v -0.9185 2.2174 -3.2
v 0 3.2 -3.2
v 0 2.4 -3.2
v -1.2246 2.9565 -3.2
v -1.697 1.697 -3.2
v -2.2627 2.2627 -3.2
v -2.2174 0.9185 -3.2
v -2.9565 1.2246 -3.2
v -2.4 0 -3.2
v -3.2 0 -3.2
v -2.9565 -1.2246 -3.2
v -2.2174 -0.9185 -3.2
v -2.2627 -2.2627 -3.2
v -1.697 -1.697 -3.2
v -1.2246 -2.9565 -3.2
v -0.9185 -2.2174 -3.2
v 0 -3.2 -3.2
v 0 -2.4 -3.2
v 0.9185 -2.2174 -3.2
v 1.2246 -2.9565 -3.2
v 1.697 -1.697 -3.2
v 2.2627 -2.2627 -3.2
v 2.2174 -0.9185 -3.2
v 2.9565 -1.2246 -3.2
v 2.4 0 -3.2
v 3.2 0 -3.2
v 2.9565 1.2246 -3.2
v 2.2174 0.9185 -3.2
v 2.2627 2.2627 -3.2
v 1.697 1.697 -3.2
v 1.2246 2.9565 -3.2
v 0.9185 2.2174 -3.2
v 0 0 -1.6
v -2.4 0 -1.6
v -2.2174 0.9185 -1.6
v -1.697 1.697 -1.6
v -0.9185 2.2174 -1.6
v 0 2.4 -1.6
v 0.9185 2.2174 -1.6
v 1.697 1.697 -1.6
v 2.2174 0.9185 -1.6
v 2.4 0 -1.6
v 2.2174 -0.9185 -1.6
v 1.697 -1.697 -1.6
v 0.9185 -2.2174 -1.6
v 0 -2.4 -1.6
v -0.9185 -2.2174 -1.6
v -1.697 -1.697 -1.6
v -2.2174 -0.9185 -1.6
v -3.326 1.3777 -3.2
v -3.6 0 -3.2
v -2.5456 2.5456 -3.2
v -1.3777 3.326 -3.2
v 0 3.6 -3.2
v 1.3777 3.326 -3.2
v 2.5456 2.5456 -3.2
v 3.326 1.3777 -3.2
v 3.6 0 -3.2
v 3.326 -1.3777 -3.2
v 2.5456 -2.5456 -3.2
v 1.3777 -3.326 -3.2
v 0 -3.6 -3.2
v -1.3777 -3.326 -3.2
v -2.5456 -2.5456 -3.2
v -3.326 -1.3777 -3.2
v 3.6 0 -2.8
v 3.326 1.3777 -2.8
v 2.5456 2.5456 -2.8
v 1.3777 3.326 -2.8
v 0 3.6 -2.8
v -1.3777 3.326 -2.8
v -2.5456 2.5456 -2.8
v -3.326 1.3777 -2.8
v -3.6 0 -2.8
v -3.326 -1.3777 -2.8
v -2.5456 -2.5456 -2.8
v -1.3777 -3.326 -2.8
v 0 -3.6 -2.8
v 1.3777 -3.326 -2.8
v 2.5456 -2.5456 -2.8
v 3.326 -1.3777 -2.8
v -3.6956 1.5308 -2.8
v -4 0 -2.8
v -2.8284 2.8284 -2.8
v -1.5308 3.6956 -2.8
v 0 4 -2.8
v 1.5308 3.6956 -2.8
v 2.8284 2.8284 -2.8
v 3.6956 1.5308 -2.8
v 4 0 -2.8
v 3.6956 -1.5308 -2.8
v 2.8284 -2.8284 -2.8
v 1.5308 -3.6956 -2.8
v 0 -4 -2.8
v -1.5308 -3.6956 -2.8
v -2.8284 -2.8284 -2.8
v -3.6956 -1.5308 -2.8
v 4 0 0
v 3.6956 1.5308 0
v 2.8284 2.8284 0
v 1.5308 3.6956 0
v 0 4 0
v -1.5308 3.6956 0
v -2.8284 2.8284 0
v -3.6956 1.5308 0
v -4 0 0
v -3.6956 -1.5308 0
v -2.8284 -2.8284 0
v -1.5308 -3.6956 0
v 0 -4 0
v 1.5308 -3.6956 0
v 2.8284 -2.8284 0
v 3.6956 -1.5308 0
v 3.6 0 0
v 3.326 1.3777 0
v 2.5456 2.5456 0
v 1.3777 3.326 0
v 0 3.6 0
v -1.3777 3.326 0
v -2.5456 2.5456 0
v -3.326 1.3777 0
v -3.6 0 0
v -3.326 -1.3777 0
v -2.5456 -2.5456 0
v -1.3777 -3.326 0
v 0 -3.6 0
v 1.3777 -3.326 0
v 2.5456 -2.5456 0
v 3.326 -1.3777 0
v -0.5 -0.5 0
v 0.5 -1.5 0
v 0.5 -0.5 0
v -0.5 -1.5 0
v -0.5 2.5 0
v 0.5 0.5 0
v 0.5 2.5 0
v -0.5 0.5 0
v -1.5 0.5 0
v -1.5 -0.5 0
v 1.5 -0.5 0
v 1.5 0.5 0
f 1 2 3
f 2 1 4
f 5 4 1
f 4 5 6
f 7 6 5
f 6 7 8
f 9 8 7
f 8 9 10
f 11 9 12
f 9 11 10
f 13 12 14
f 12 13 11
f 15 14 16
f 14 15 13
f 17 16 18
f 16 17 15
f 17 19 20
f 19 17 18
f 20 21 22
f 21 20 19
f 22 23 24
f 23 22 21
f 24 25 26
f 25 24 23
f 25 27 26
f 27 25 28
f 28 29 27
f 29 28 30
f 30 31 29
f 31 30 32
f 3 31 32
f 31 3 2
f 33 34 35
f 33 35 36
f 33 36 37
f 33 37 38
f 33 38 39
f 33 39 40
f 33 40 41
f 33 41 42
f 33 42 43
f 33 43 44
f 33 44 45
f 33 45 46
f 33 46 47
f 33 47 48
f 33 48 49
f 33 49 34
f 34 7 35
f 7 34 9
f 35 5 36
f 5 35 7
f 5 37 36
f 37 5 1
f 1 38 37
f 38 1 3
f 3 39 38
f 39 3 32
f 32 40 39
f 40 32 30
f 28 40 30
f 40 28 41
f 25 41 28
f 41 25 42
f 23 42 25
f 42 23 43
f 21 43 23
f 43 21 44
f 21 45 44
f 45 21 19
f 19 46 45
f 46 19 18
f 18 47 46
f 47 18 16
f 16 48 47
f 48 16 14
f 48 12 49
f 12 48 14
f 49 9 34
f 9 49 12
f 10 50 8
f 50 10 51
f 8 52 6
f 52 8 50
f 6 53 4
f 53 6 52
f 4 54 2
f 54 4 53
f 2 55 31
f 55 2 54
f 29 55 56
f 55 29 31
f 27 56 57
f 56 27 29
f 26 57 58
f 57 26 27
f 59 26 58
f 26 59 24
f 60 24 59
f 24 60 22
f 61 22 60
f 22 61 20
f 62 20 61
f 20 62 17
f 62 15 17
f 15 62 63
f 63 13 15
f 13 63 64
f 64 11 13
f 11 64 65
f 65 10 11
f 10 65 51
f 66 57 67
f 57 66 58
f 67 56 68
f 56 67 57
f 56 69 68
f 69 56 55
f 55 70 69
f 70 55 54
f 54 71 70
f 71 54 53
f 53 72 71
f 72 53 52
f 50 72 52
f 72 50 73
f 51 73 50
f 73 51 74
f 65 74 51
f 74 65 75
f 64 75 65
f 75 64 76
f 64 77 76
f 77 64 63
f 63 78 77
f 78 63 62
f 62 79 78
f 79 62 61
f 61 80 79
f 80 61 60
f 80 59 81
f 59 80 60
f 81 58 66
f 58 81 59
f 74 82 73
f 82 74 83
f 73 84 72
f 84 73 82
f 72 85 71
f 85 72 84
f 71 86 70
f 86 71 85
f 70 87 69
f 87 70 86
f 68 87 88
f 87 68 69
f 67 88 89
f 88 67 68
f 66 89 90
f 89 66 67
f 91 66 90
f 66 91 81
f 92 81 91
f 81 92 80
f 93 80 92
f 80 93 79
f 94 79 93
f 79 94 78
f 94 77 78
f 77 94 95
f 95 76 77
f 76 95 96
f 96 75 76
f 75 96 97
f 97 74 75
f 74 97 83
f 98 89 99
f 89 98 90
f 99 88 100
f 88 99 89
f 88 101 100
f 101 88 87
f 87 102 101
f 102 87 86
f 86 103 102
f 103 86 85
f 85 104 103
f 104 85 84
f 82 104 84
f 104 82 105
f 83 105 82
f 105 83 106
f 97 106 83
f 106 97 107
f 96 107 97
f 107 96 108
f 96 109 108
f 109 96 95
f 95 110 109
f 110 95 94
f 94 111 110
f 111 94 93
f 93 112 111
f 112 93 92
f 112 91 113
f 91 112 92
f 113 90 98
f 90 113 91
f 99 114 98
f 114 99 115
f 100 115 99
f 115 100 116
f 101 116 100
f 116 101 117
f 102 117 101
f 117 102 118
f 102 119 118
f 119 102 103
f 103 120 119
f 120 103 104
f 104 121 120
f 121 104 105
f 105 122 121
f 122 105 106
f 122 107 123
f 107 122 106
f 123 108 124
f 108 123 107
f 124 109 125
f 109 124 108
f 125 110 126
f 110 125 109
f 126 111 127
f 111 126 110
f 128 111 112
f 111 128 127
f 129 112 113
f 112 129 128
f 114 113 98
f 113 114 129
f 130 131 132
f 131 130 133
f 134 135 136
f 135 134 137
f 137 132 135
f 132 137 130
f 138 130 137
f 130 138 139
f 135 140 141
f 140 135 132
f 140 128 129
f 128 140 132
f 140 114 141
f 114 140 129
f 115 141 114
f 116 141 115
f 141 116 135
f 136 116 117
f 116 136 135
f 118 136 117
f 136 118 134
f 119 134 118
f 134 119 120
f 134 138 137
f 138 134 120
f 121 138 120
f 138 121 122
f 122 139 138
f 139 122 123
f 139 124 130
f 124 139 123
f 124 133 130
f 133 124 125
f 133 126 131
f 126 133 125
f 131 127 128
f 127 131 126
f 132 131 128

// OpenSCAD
// file: ../p/4-4disc.scad
use <../lib.scad>
function ldraw_lib__4_4disc() = [
// 0 Disc 1.0
// 0 Name: 4-4disc.dat
// 0 Author: James Jessiman
// 0 !LDRAW_ORG Primitive UPDATE 2002-02
// 0 !LICENSE Licensed under CC BY 4.0 : see CAreadme.txt
// 
// 0 BFC CERTIFY CCW
  [0,"BFC","CERTIFY"],
  [0,"BFC","CCW"],
// 
// 0 !HISTORY 1998-12-15 [PTadmin] Official Update 1998-10
// 0 !HISTORY 2002-03-23 [sbliss] Added BFC statement
// 0 !HISTORY 2002-04-25 [PTadmin] Official Update 2002-02
// 0 !HISTORY 2007-06-24 [PTadmin] Header formatted for Contributor Agreement
// 0 !HISTORY 2008-07-01 [PTadmin] Official Update 2008-01
// 
// 
// 3 16 0 0 0 1 0 0 0.9239 0 0.3827
  [3,16,0,0,0,1,0,0,0.9239,0,0.3827],
// 3 16 0 0 0 0.9239 0 0.3827 0.7071 0 0.7071
  [3,16,0,0,0,0.9239,0,0.3827,0.7071,0,0.7071],
// 3 16 0 0 0 0.7071 0 0.7071 0.3827 0 0.9239
  [3,16,0,0,0,0.7071,0,0.7071,0.3827,0,0.9239],
// 3 16 0 0 0 0.3827 0 0.9239 0 0 1
  [3,16,0,0,0,0.3827,0,0.9239,0,0,1],
// 3 16 0 0 0 0 0 1 -0.3827 0 0.9239
  [3,16,0,0,0,0,0,1,-0.3827,0,0.9239],
// 3 16 0 0 0 -0.3827 0 0.9239 -0.7071 0 0.7071
  [3,16,0,0,0,-0.3827,0,0.9239,-0.7071,0,0.7071],
// 3 16 0 0 0 -0.7071 0 0.7071 -0.9239 0 0.3827
  [3,16,0,0,0,-0.7071,0,0.7071,-0.9239,0,0.3827],
// 3 16 0 0 0 -0.9239 0 0.3827 -1 0 -0
  [3,16,0,0,0,-0.9239,0,0.3827,-1,0,-0],
// 3 16 0 0 0 -1 0 -0 -0.9239 0 -0.3827
  [3,16,0,0,0,-1,0,-0,-0.9239,0,-0.3827],
// 3 16 0 0 0 -0.9239 0 -0.3827 -0.7071 0 -0.7071
  [3,16,0,0,0,-0.9239,0,-0.3827,-0.7071,0,-0.7071],
// 3 16 0 0 0 -0.7071 0 -0.7071 -0.3827 0 -0.9239
  [3,16,0,0,0,-0.7071,0,-0.7071,-0.3827,0,-0.9239],
// 3 16 0 0 0 -0.3827 0 -0.9239 0 0 -1
  [3,16,0,0,0,-0.3827,0,-0.9239,0,0,-1],
// 3 16 0 0 0 0 0 -1 0.3827 0 -0.9239
  [3,16,0,0,0,0,0,-1,0.3827,0,-0.9239],
// 3 16 0 0 0 0.3827 0 -0.9239 0.7071 0 -0.7071
  [3,16,0,0,0,0.3827,0,-0.9239,0.7071,0,-0.7071],
// 3 16 0 0 0 0.7071 0 -0.7071 0.9239 0 -0.3827
  [3,16,0,0,0,0.7071,0,-0.7071,0.9239,0,-0.3827],
// 3 16 0 0 0 0.9239 0 -0.3827 1 0 0
  [3,16,0,0,0,0.9239,0,-0.3827,1,0,0],
// 0
];
module ldraw_lib__4_4disc(step=0, col=false, unit=2/5, alt=false, line=0.2, solid=!$preview)
    makepoly(ldraw_lib__4_4disc(), step=step, col=col, unit=unit, alt=alt, line=line, solid=solid);
ldraw_lib__4_4disc(line=0.2);
// file: ../p/4-4ring3.scad
use <../lib.scad>
function ldraw_lib__4_4ring3() = [
// 0 Ring  3 x 1.0
// 0 Name: 4-4ring3.dat
// 0 Author: James Jessiman
// 0 !LDRAW_ORG Primitive UPDATE 2009-01
// 0 !LICENSE Licensed under CC BY 2.0 and CC BY 4.0 : see CAreadme.txt
// 
// 0 BFC CERTIFY CCW
  [0,"BFC","CERTIFY"],
  [0,"BFC","CCW"],
// 
// 0 !HISTORY 1998-12-15 [PTadmin] Official Update 1998-10
// 0 !HISTORY 2002-04-05 [hafhead] Added BFC statement
// 0 !HISTORY 2002-04-25 [PTadmin] Official Update 2002-02
// 0 !HISTORY 2007-06-24 [PTadmin] Header formatted for Contributor Agreement
// 0 !HISTORY 2008-07-01 [PTadmin] Official Update 2008-01
// 0 !HISTORY 2008-08-26 [cwdee] Switch polygon winding and rename
// 0 !HISTORY 2009-05-02 [PTadmin] Official Update 2009-01
// 
// 
// 4 16 -1.5308 0 3.6956 -1.1481 0 2.7717 0 0 3 0 0 4
  [4,16,-1.5308,0,3.6956,-1.1481,0,2.7717,0,0,3,0,0,4],
// 4 16 -2.8284 0 2.8284 -2.1213 0 2.1213 -1.1481 0 2.7717 -1.5308 0 3.6956
  [4,16,-2.8284,0,2.8284,-2.1213,0,2.1213,-1.1481,0,2.7717,-1.5308,0,3.6956],
// 4 16 -3.6956 0 1.5308 -2.7717 0 1.1481 -2.1213 0 2.1213 -2.8284 0 2.8284
  [4,16,-3.6956,0,1.5308,-2.7717,0,1.1481,-2.1213,0,2.1213,-2.8284,0,2.8284],
// 4 16 -4 0 0 -3 0 0 -2.7717 0 1.1481 -3.6956 0 1.5308
  [4,16,-4,0,0,-3,0,0,-2.7717,0,1.1481,-3.6956,0,1.5308],
// 4 16 -3.6956 0 -1.5308 -2.7717 0 -1.1481 -3 0 0 -4 0 0
  [4,16,-3.6956,0,-1.5308,-2.7717,0,-1.1481,-3,0,0,-4,0,0],
// 4 16 -2.8284 0 -2.8284 -2.1213 0 -2.1213 -2.7717 0 -1.1481 -3.6956 0 -1.5308
  [4,16,-2.8284,0,-2.8284,-2.1213,0,-2.1213,-2.7717,0,-1.1481,-3.6956,0,-1.5308],
// 4 16 -1.5308 0 -3.6956 -1.1481 0 -2.7717 -2.1213 0 -2.1213 -2.8284 0 -2.8284
  [4,16,-1.5308,0,-3.6956,-1.1481,0,-2.7717,-2.1213,0,-2.1213,-2.8284,0,-2.8284],
// 4 16 0 0 -4 0 0 -3 -1.1481 0 -2.7717 -1.5308 0 -3.6956
  [4,16,0,0,-4,0,0,-3,-1.1481,0,-2.7717,-1.5308,0,-3.6956],
// 4 16 1.5308 0 -3.6956 1.1481 0 -2.7717 0 0 -3 0 0 -4
  [4,16,1.5308,0,-3.6956,1.1481,0,-2.7717,0,0,-3,0,0,-4],
// 4 16 2.8284 0 -2.8284 2.1213 0 -2.1213 1.1481 0 -2.7717 1.5308 0 -3.6956
  [4,16,2.8284,0,-2.8284,2.1213,0,-2.1213,1.1481,0,-2.7717,1.5308,0,-3.6956],
// 4 16 3.6956 0 -1.5308 2.7717 0 -1.1481 2.1213 0 -2.1213 2.8284 0 -2.8284
  [4,16,3.6956,0,-1.5308,2.7717,0,-1.1481,2.1213,0,-2.1213,2.8284,0,-2.8284],
// 4 16 4 0 0 3 0 0 2.7717 0 -1.1481 3.6956 0 -1.5308
  [4,16,4,0,0,3,0,0,2.7717,0,-1.1481,3.6956,0,-1.5308],
// 4 16 3.6956 0 1.5308 2.7717 0 1.1481 3 0 0 4 0 0
  [4,16,3.6956,0,1.5308,2.7717,0,1.1481,3,0,0,4,0,0],
// 4 16 2.8284 0 2.8284 2.1213 0 2.1213 2.7717 0 1.1481 3.6956 0 1.5308
  [4,16,2.8284,0,2.8284,2.1213,0,2.1213,2.7717,0,1.1481,3.6956,0,1.5308],
// 4 16 1.5308 0 3.6956 1.1481 0 2.7717 2.1213 0 2.1213 2.8284 0 2.8284
  [4,16,1.5308,0,3.6956,1.1481,0,2.7717,2.1213,0,2.1213,2.8284,0,2.8284],
// 4 16 0 0 4 0 0 3 1.1481 0 2.7717 1.5308 0 3.6956
  [4,16,0,0,4,0,0,3,1.1481,0,2.7717,1.5308,0,3.6956],
// 0
];
module ldraw_lib__4_4ring3(step=0, col=false, unit=2/5, alt=false, line=0.2, solid=!$preview)
    makepoly(ldraw_lib__4_4ring3(), step=step, col=col, unit=unit, alt=alt, line=line, solid=solid);
ldraw_lib__4_4ring3(line=0.2);
// file: ../p/4-4cylc.scad
use <../lib.scad>
use <4-4cyli.scad>
use <4-4disc.scad>
use <4-4edge.scad>
function ldraw_lib__4_4cylc() = [
// 0 Cylinder Closed 1.0
// 0 Name: 4-4cylc.dat
// 0 Author: Alex Taylor [anathema]
// 0 !LDRAW_ORG Primitive UPDATE 2009-02
// 0 !LICENSE Licensed under CC BY 2.0 and CC BY 4.0 : see CAreadme.txt
// 
// 0 BFC CERTIFY CCW
  [0,"BFC","CERTIFY"],
  [0,"BFC","CCW"],
// 
// 0 !HISTORY 2008-12-29 [cwdee] Removed one disc
// 0 !HISTORY 2009-09-03 [PTadmin] Official Update 2009-02
// 
// 
// 1 16 0 0 0 1 0 0 0 1 0 0 0 1 4-4edge.dat
  [1,16,0,0,0,1,0,0,0,1,0,0,0,1, ldraw_lib__4_4edge()],
// 1 16 0 1 0 1 0 0 0 1 0 0 0 1 4-4edge.dat
  [1,16,0,1,0,1,0,0,0,1,0,0,0,1, ldraw_lib__4_4edge()],
// 1 16 0 0 0 1 0 0 0 1 0 0 0 1 4-4disc.dat
  [1,16,0,0,0,1,0,0,0,1,0,0,0,1, ldraw_lib__4_4disc()],
// 1 16 0 0 0 1 0 0 0 1 0 0 0 1 4-4cyli.dat
  [1,16,0,0,0,1,0,0,0,1,0,0,0,1, ldraw_lib__4_4cyli()],
// 0
];
module ldraw_lib__4_4cylc(step=0, col=false, unit=2/5, alt=false, line=0.2, solid=!$preview)
    makepoly(ldraw_lib__4_4cylc(), step=step, col=col, unit=unit, alt=alt, line=line, solid=solid);
ldraw_lib__4_4cylc(line=0.2);
// file: ../p/4-4edge.scad
use <../lib.scad>
function ldraw_lib__4_4edge() = [
// 0 Circle 1.0
// 0 Name: 4-4edge.dat
// 0 Author: James Jessiman
// 0 !LDRAW_ORG Primitive UPDATE 2017-01
// 0 !LICENSE Licensed under CC BY 4.0 : see CAreadme.txt
// 
// 0 BFC CERTIFY CCW
  [0,"BFC","CERTIFY"],
  [0,"BFC","CCW"],
// 
// 0 !HISTORY 1998-12-15 [PTadmin] Official Update 1998-10
// 0 !HISTORY 2005-12-28 [PTadmin] Official Update 2005-01
// 0 !HISTORY 2007-06-24 [PTadmin] Header formatted for Contributor Agreement
// 0 !HISTORY 2008-07-01 [PTadmin] Official Update 2008-01
// 0 !HISTORY 2017-01-15 [Steffen] BFCed
// 0 !HISTORY 2017-12-30 [PTadmin] Official Update 2017-01
// 
// 
// 2 24 1 0 0 0.9239 0 0.3827
  [2,24,1,0,0,0.9239,0,0.3827],
// 2 24 0.9239 0 0.3827 0.7071 0 0.7071
  [2,24,0.9239,0,0.3827,0.7071,0,0.7071],
// 2 24 0.7071 0 0.7071 0.3827 0 0.9239
  [2,24,0.7071,0,0.7071,0.3827,0,0.9239],
// 2 24 0.3827 0 0.9239 0 0 1
  [2,24,0.3827,0,0.9239,0,0,1],
// 2 24 0 0 1 -0.3827 0 0.9239
  [2,24,0,0,1,-0.3827,0,0.9239],
// 2 24 -0.3827 0 0.9239 -0.7071 0 0.7071
  [2,24,-0.3827,0,0.9239,-0.7071,0,0.7071],
// 2 24 -0.7071 0 0.7071 -0.9239 0 0.3827
  [2,24,-0.7071,0,0.7071,-0.9239,0,0.3827],
// 2 24 -0.9239 0 0.3827 -1 0 -0
  [2,24,-0.9239,0,0.3827,-1,0,-0],
// 2 24 -1 0 -0 -0.9239 0 -0.3827
  [2,24,-1,0,-0,-0.9239,0,-0.3827],
// 2 24 -0.9239 0 -0.3827 -0.7071 0 -0.7071
  [2,24,-0.9239,0,-0.3827,-0.7071,0,-0.7071],
// 2 24 -0.7071 0 -0.7071 -0.3827 0 -0.9239
  [2,24,-0.7071,0,-0.7071,-0.3827,0,-0.9239],
// 2 24 -0.3827 0 -0.9239 0 0 -1
  [2,24,-0.3827,0,-0.9239,0,0,-1],
// 2 24 0 0 -1 0.3827 0 -0.9239
  [2,24,0,0,-1,0.3827,0,-0.9239],
// 2 24 0.3827 0 -0.9239 0.7071 0 -0.7071
  [2,24,0.3827,0,-0.9239,0.7071,0,-0.7071],
// 2 24 0.7071 0 -0.7071 0.9239 0 -0.3827
  [2,24,0.7071,0,-0.7071,0.9239,0,-0.3827],
// 2 24 0.9239 0 -0.3827 1 0 0
  [2,24,0.9239,0,-0.3827,1,0,0],
];
module ldraw_lib__4_4edge(step=0, col=false, unit=2/5, alt=false, line=0.2, solid=!$preview)
    makepoly(ldraw_lib__4_4edge(), step=step, col=col, unit=unit, alt=alt, line=line, solid=solid);
ldraw_lib__4_4edge(line=0.2);
// file: ../p/4-4cyli.scad
use <../lib.scad>
function ldraw_lib__4_4cyli() = [
// 0 Cylinder 1.0
// 0 Name: 4-4cyli.dat
// 0 Author: James Jessiman
// 0 !LDRAW_ORG Primitive UPDATE 2005-01
// 0 !LICENSE Licensed under CC BY 2.0 and CC BY 4.0 : see CAreadme.txt
// 
// 0 BFC CERTIFY CCW
  [0,"BFC","CERTIFY"],
  [0,"BFC","CCW"],
// 
// 0 !HISTORY 1998-12-15 [PTadmin] Official Update 1998-10
// 0 !HISTORY 2002-03-23 [sbliss] Added BFC statement; merged headers from files in distributions LDraw 0.27 and Complete.
// 0 !HISTORY 2002-04-25 [PTadmin] Official Update 2002-02
// 0 !HISTORY 2004-12-14 [guyvivan] BFC CCW
// 0 !HISTORY 2005-12-28 [PTadmin] Official Update 2005-01
// 0 !HISTORY 2007-06-24 [PTadmin] Header formatted for Contributor Agreement
// 0 !HISTORY 2008-07-01 [PTadmin] Official Update 2008-01
// 
// 
// 4 16 1 1 0 0.9239 1 0.3827 0.9239 0 0.3827 1 0 0
  [4,16,1,1,0,0.9239,1,0.3827,0.9239,0,0.3827,1,0,0],
// 5 24 1 0 0 1 1 0 0.9239 0 0.3827 0.9239 0 -0.3827
  [5,24,1,0,0,1,1,0,0.9239,0,0.3827,0.9239,0,-0.3827],
// 4 16 0.9239 1 0.3827 0.7071 1 0.7071 0.7071 0 0.7071 0.9239 0 0.3827
  [4,16,0.9239,1,0.3827,0.7071,1,0.7071,0.7071,0,0.7071,0.9239,0,0.3827],
// 5 24 0.9239 0 0.3827 0.9239 1 0.3827 0.7071 0 0.7071 1 0 0
  [5,24,0.9239,0,0.3827,0.9239,1,0.3827,0.7071,0,0.7071,1,0,0],
// 4 16 0.7071 1 0.7071 0.3827 1 0.9239 0.3827 0 0.9239 0.7071 0 0.7071
  [4,16,0.7071,1,0.7071,0.3827,1,0.9239,0.3827,0,0.9239,0.7071,0,0.7071],
// 5 24 0.7071 0 0.7071 0.7071 1 0.7071 0.3827 0 0.9239 0.9239 0 0.3827
  [5,24,0.7071,0,0.7071,0.7071,1,0.7071,0.3827,0,0.9239,0.9239,0,0.3827],
// 4 16 0.3827 1 0.9239 0 1 1 0 0 1 0.3827 0 0.9239
  [4,16,0.3827,1,0.9239,0,1,1,0,0,1,0.3827,0,0.9239],
// 5 24 0.3827 0 0.9239 0.3827 1 0.9239 0 0 1 0.7071 0 0.7071
  [5,24,0.3827,0,0.9239,0.3827,1,0.9239,0,0,1,0.7071,0,0.7071],
// 4 16 0 1 1 -0.3827 1 0.9239 -0.3827 0 0.9239 0 0 1
  [4,16,0,1,1,-0.3827,1,0.9239,-0.3827,0,0.9239,0,0,1],
// 5 24 0 0 1 0 1 1 -0.3827 0 0.9239 0.3827 0 0.9239
  [5,24,0,0,1,0,1,1,-0.3827,0,0.9239,0.3827,0,0.9239],
// 4 16 -0.3827 1 0.9239 -0.7071 1 0.7071 -0.7071 0 0.7071 -0.3827 0 0.9239
  [4,16,-0.3827,1,0.9239,-0.7071,1,0.7071,-0.7071,0,0.7071,-0.3827,0,0.9239],
// 5 24 -0.3827 0 0.9239 -0.3827 1 0.9239 -0.7071 0 0.7071 0 0 1
  [5,24,-0.3827,0,0.9239,-0.3827,1,0.9239,-0.7071,0,0.7071,0,0,1],
// 4 16 -0.7071 1 0.7071 -0.9239 1 0.3827 -0.9239 0 0.3827 -0.7071 0 0.7071
  [4,16,-0.7071,1,0.7071,-0.9239,1,0.3827,-0.9239,0,0.3827,-0.7071,0,0.7071],
// 5 24 -0.7071 0 0.7071 -0.7071 1 0.7071 -0.9239 0 0.3827 -0.3827 0 0.9239
  [5,24,-0.7071,0,0.7071,-0.7071,1,0.7071,-0.9239,0,0.3827,-0.3827,0,0.9239],
// 4 16 -0.9239 1 0.3827 -1 1 0 -1 0 0 -0.9239 0 0.3827
  [4,16,-0.9239,1,0.3827,-1,1,0,-1,0,0,-0.9239,0,0.3827],
// 5 24 -0.9239 0 0.3827 -0.9239 1 0.3827 -1 0 0 -0.7071 0 0.7071
  [5,24,-0.9239,0,0.3827,-0.9239,1,0.3827,-1,0,0,-0.7071,0,0.7071],
// 4 16 -1 1 0 -0.9239 1 -0.3827 -0.9239 0 -0.3827 -1 0 0
  [4,16,-1,1,0,-0.9239,1,-0.3827,-0.9239,0,-0.3827,-1,0,0],
// 5 24 -1 0 0 -1 1 0 -0.9239 0 -0.3827 -0.9239 0 0.3827
  [5,24,-1,0,0,-1,1,0,-0.9239,0,-0.3827,-0.9239,0,0.3827],
// 4 16 -0.9239 1 -0.3827 -0.7071 1 -0.7071 -0.7071 0 -0.7071 -0.9239 0 -0.3827
  [4,16,-0.9239,1,-0.3827,-0.7071,1,-0.7071,-0.7071,0,-0.7071,-0.9239,0,-0.3827],
// 5 24 -0.9239 0 -0.3827 -0.9239 1 -0.3827 -0.7071 0 -0.7071 -1 0 0
  [5,24,-0.9239,0,-0.3827,-0.9239,1,-0.3827,-0.7071,0,-0.7071,-1,0,0],
// 4 16 -0.7071 1 -0.7071 -0.3827 1 -0.9239 -0.3827 0 -0.9239 -0.7071 0 -0.7071
  [4,16,-0.7071,1,-0.7071,-0.3827,1,-0.9239,-0.3827,0,-0.9239,-0.7071,0,-0.7071],
// 5 24 -0.7071 0 -0.7071 -0.7071 1 -0.7071 -0.3827 0 -0.9239 -0.9239 0 -0.3827
  [5,24,-0.7071,0,-0.7071,-0.7071,1,-0.7071,-0.3827,0,-0.9239,-0.9239,0,-0.3827],
// 4 16 -0.3827 1 -0.9239 0 1 -1 0 0 -1 -0.3827 0 -0.9239
  [4,16,-0.3827,1,-0.9239,0,1,-1,0,0,-1,-0.3827,0,-0.9239],
// 5 24 -0.3827 0 -0.9239 -0.3827 1 -0.9239 0 0 -1 -0.7071 0 -0.7071
  [5,24,-0.3827,0,-0.9239,-0.3827,1,-0.9239,0,0,-1,-0.7071,0,-0.7071],
// 4 16 0 1 -1 0.3827 1 -0.9239 0.3827 0 -0.9239 0 0 -1
  [4,16,0,1,-1,0.3827,1,-0.9239,0.3827,0,-0.9239,0,0,-1],
// 5 24 0 0 -1 0 1 -1 0.3827 0 -0.9239 -0.3827 0 -0.9239
  [5,24,0,0,-1,0,1,-1,0.3827,0,-0.9239,-0.3827,0,-0.9239],
// 4 16 0.3827 1 -0.9239 0.7071 1 -0.7071 0.7071 0 -0.7071 0.3827 0 -0.9239
  [4,16,0.3827,1,-0.9239,0.7071,1,-0.7071,0.7071,0,-0.7071,0.3827,0,-0.9239],
// 5 24 0.3827 0 -0.9239 0.3827 1 -0.9239 0.7071 0 -0.7071 0 0 -1
  [5,24,0.3827,0,-0.9239,0.3827,1,-0.9239,0.7071,0,-0.7071,0,0,-1],
// 4 16 0.7071 1 -0.7071 0.9239 1 -0.3827 0.9239 0 -0.3827 0.7071 0 -0.7071
  [4,16,0.7071,1,-0.7071,0.9239,1,-0.3827,0.9239,0,-0.3827,0.7071,0,-0.7071],
// 5 24 0.7071 0 -0.7071 0.7071 1 -0.7071 0.9239 0 -0.3827 0.3827 0 -0.9239
  [5,24,0.7071,0,-0.7071,0.7071,1,-0.7071,0.9239,0,-0.3827,0.3827,0,-0.9239],
// 4 16 0.9239 1 -0.3827 1 1 0 1 0 0 0.9239 0 -0.3827
  [4,16,0.9239,1,-0.3827,1,1,0,1,0,0,0.9239,0,-0.3827],
// 5 24 0.9239 0 -0.3827 0.9239 1 -0.3827 1 0 0 0.7071 0 -0.7071
  [5,24,0.9239,0,-0.3827,0.9239,1,-0.3827,1,0,0,0.7071,0,-0.7071],
// 0
];
module ldraw_lib__4_4cyli(step=0, col=false, unit=2/5, alt=false, line=0.2, solid=!$preview)
    makepoly(ldraw_lib__4_4cyli(), step=step, col=col, unit=unit, alt=alt, line=line, solid=solid);
ldraw_lib__4_4cyli(line=0.2);
// file: ../p/stud4o.scad
use <../lib.scad>
use <4-4cylc.scad>
use <4-4ring3.scad>
function ldraw_lib__stud4o() = [
// 0 Stud Tube Open without Outer Cylinder
// 0 Name: stud4o.dat
// 0 Author: Magnus Forsberg [MagFors]
// 0 !LDRAW_ORG Primitive UPDATE 2011-02
// 0 !LICENSE Licensed under CC BY 4.0 : see CAreadme.txt
// 
// 0 !HELP This stud is a "antistud" to be used like a underside stud,
// 0 !HELP but without the outer cylinder.
// 0 !HELP 1 47 0 0 0 1 0 0 0 1 0 0 0 1 stud4.dat
// 
// 0 BFC CERTIFY CCW
  [0,"BFC","CERTIFY"],
  [0,"BFC","CCW"],
// 
// 0 !HISTORY 2011-12-29 [PTadmin] Official Update 2011-02
// 
// 
// 1 16 0 -4 0 2 0 0 0 1 0 0 0 2 4-4ring3.dat
  [1,16,0,-4,0,2,0,0,0,1,0,0,0,2, ldraw_lib__4_4ring3()],
// 0 BFC INVERTNEXT
  [0,"BFC","INVERTNEXT"],
// 1 16 0 0 0 -6 0 0 0 -4 0 0 0 6 4-4cylc.dat
  [1,16,0,0,0,-6,0,0,0,-4,0,0,0,6, ldraw_lib__4_4cylc()],
];
module ldraw_lib__stud4o(step=0, col=false, unit=2/5, alt=false, line=0.2, solid=!$preview)
    makepoly(ldraw_lib__stud4o(), step=step, col=col, unit=unit, alt=alt, line=line, solid=solid);
ldraw_lib__stud4o(line=0.2);
// file: ../p/4-4ring8.scad
use <../lib.scad>
function ldraw_lib__4_4ring8() = [
// 0 Ring  8 x 1.0
// 0 Name: 4-4ring8.dat
// 0 Author: Steffen [Steffen]
// 0 !LDRAW_ORG Primitive UPDATE 2012-01
// 0 !LICENSE Licensed under CC BY 4.0 : see CAreadme.txt
// 
// 0 BFC CERTIFY CCW
  [0,"BFC","CERTIFY"],
  [0,"BFC","CCW"],
// 
// 0 !HISTORY 2003-12-19 [PTadmin] Official Update 2003-03
// 0 !HISTORY 2007-06-24 [PTadmin] Header formatted for Contributor Agreement
// 0 !HISTORY 2008-07-01 [PTadmin] Official Update 2008-01
// 0 !HISTORY 2012-02-16 [Philo] Changed to CCW
// 0 !HISTORY 2012-03-30 [PTadmin] Official Update 2012-01
// 
// 
// 4 16 9 0 0 8.3151 0 3.4443 7.3912 0 3.0616 8 0 0
  [4,16,9,0,0,8.3151,0,3.4443,7.3912,0,3.0616,8,0,0],
// 4 16 8.3151 0 3.4443 6.3639 0 6.3639 5.6568 0 5.6568 7.3912 0 3.0616
  [4,16,8.3151,0,3.4443,6.3639,0,6.3639,5.6568,0,5.6568,7.3912,0,3.0616],
// 4 16 6.3639 0 6.3639 3.4443 0 8.3151 3.0616 0 7.3912 5.6568 0 5.6568
  [4,16,6.3639,0,6.3639,3.4443,0,8.3151,3.0616,0,7.3912,5.6568,0,5.6568],
// 4 16 3.4443 0 8.3151 0 0 9 0 0 8 3.0616 0 7.3912
  [4,16,3.4443,0,8.3151,0,0,9,0,0,8,3.0616,0,7.3912],
// 4 16 0 0 9 -3.4443 0 8.3151 -3.0616 0 7.3912 0 0 8
  [4,16,0,0,9,-3.4443,0,8.3151,-3.0616,0,7.3912,0,0,8],
// 4 16 -3.4443 0 8.3151 -6.3639 0 6.3639 -5.6568 0 5.6568 -3.0616 0 7.3912
  [4,16,-3.4443,0,8.3151,-6.3639,0,6.3639,-5.6568,0,5.6568,-3.0616,0,7.3912],
// 4 16 -6.3639 0 6.3639 -8.3151 0 3.4443 -7.3912 0 3.0616 -5.6568 0 5.6568
  [4,16,-6.3639,0,6.3639,-8.3151,0,3.4443,-7.3912,0,3.0616,-5.6568,0,5.6568],
// 4 16 -8.3151 0 3.4443 -9 0 0 -8 0 0 -7.3912 0 3.0616
  [4,16,-8.3151,0,3.4443,-9,0,0,-8,0,0,-7.3912,0,3.0616],
// 4 16 -9 0 0 -8.3151 0 -3.4443 -7.3912 0 -3.0616 -8 0 0
  [4,16,-9,0,0,-8.3151,0,-3.4443,-7.3912,0,-3.0616,-8,0,0],
// 4 16 -8.3151 0 -3.4443 -6.3639 0 -6.3639 -5.6568 0 -5.6568 -7.3912 0 -3.0616
  [4,16,-8.3151,0,-3.4443,-6.3639,0,-6.3639,-5.6568,0,-5.6568,-7.3912,0,-3.0616],
// 4 16 -6.3639 0 -6.3639 -3.4443 0 -8.3151 -3.0616 0 -7.3912 -5.6568 0 -5.6568
  [4,16,-6.3639,0,-6.3639,-3.4443,0,-8.3151,-3.0616,0,-7.3912,-5.6568,0,-5.6568],
// 4 16 -3.4443 0 -8.3151 0 0 -9 0 0 -8 -3.0616 0 -7.3912
  [4,16,-3.4443,0,-8.3151,0,0,-9,0,0,-8,-3.0616,0,-7.3912],
// 4 16 0 0 -9 3.4443 0 -8.3151 3.0616 0 -7.3912 0 0 -8
  [4,16,0,0,-9,3.4443,0,-8.3151,3.0616,0,-7.3912,0,0,-8],
// 4 16 3.4443 0 -8.3151 6.3639 0 -6.3639 5.6568 0 -5.6568 3.0616 0 -7.3912
  [4,16,3.4443,0,-8.3151,6.3639,0,-6.3639,5.6568,0,-5.6568,3.0616,0,-7.3912],
// 4 16 6.3639 0 -6.3639 8.3151 0 -3.4443 7.3912 0 -3.0616 5.6568 0 -5.6568
  [4,16,6.3639,0,-6.3639,8.3151,0,-3.4443,7.3912,0,-3.0616,5.6568,0,-5.6568],
// 4 16 8.3151 0 -3.4443 9 0 0 8 0 0 7.3912 0 -3.0616
  [4,16,8.3151,0,-3.4443,9,0,0,8,0,0,7.3912,0,-3.0616],
];
module ldraw_lib__4_4ring8(step=0, col=false, unit=2/5, alt=false, line=0.2, solid=!$preview)
    makepoly(ldraw_lib__4_4ring8(), step=step, col=col, unit=unit, alt=alt, line=line, solid=solid);
ldraw_lib__4_4ring8(line=0.2);
// file: ../p/4-4cylo.scad
use <../lib.scad>
use <4-4cyli.scad>
use <4-4edge.scad>
function ldraw_lib__4_4cylo() = [
// 0 Cylinder Open 1.0
// 0 Name: 4-4cylo.dat
// 0 Author: Mark Kennedy [mkennedy]
// 0 !LDRAW_ORG Primitive UPDATE 2010-01
// 0 !LICENSE Licensed under CC BY 4.0 : see CAreadme.txt
// 
// 0 BFC CERTIFY CCW
  [0,"BFC","CERTIFY"],
  [0,"BFC","CCW"],
// 
// 0 !HISTORY 2010-04-05 [PTadmin] Official Update 2010-01
// 
// 
// 1 16 0 0 0 1 0 0 0 1 0 0 0 1 4-4edge.dat
  [1,16,0,0,0,1,0,0,0,1,0,0,0,1, ldraw_lib__4_4edge()],
// 1 16 0 1 0 1 0 0 0 1 0 0 0 1 4-4edge.dat
  [1,16,0,1,0,1,0,0,0,1,0,0,0,1, ldraw_lib__4_4edge()],
// 1 16 0 0 0 1 0 0 0 1 0 0 0 1 4-4cyli.dat
  [1,16,0,0,0,1,0,0,0,1,0,0,0,1, ldraw_lib__4_4cyli()],
// 0
];
module ldraw_lib__4_4cylo(step=0, col=false, unit=2/5, alt=false, line=0.2, solid=!$preview)
    makepoly(ldraw_lib__4_4cylo(), step=step, col=col, unit=unit, alt=alt, line=line, solid=solid);
ldraw_lib__4_4cylo(line=0.2);
// file: ../p/empty.scad
use <../lib.scad>
function ldraw_lib__empty() = [
// 0 Empty
// 0 Name: empty.dat
// 0 Author: Steffen [Steffen]
// 0 !LDRAW_ORG Primitive UPDATE 2015-01
// 0 !LICENSE Licensed under CC BY 4.0 : see CAreadme.txt
// 
// 0 BFC CERTIFY CCW
  [0,"BFC","CERTIFY"],
  [0,"BFC","CCW"],
// 
// 0 !HISTORY 2015-10-11 [PTadmin] Official Update 2015-01
// 
// 
// 0 // Tool MLCad cannot handle really empty files. This file is used as a workaround.
// 0 // It exceptionally contains forbidden non-LDRAW standard syntax to satisfy MLCad until it is fixed OR a different editor has become the de-facto LDRAW standard.
// 0 // The line being used here is an "impossible" conditional line which never should be visible,
// 0 // additionally hidden by a syntax explicitly hiding it from displaying.
// 
// 0 MLCAD HIDE 5 24 0 0 0 0.0001 0 0 0.0001 -0.0001 0 0 0 0
];
module ldraw_lib__empty(step=0, col=false, unit=2/5, alt=false, line=0.2, solid=!$preview)
    makepoly(ldraw_lib__empty(), step=step, col=col, unit=unit, alt=alt, line=line, solid=solid);
ldraw_lib__empty(line=0.2);
// file: s/98138s02.scad
use <../../lib.scad>
use <../../p/4-4cylo.scad>
use <../../p/4-4ring8.scad>
use <../../p/4-4ring9.scad>
use <../../p/stud4o.scad>
function ldraw_lib__s__98138s02() = [
// 0 ~Tile  1 x  1 Round with Groove without Complete Top Face
// 0 Name: s\98138s02.dat
// 0 Author: Magnus Forsberg [MagFors]
// 0 !LDRAW_ORG Subpart UPDATE 2020-01
// 0 !LICENSE Licensed under CC BY 4.0 : see CAreadme.txt
// 
// 0 BFC CERTIFY CCW
  [0,"BFC","CERTIFY"],
  [0,"BFC","CCW"],
// 
// 0 !HISTORY 2020-06-28 [PTadmin] Official Update 2020-01
// 
// 
// 1 16 0 4 0 1 0 0 0 -1 0 0 0 1 stud4o.dat
  [1,16,0,4,0,1,0,0,0,-1,0,0,0,1, ldraw_lib__stud4o()],
// 1 16 0 8 0 -1 0 0 0 -1 0 0 0 1 4-4ring8.dat
  [1,16,0,8,0,-1,0,0,0,-1,0,0,0,1, ldraw_lib__4_4ring8()],
// 1 16 0 7 0 9 0 0 0 1 0 0 0 9 4-4cylo.dat
  [1,16,0,7,0,9,0,0,0,1,0,0,0,9, ldraw_lib__4_4cylo()],
// 1 16 0 7 0 -1 0 0 0 -1 0 0 0 1 4-4ring9.dat
  [1,16,0,7,0,-1,0,0,0,-1,0,0,0,1, ldraw_lib__4_4ring9()],
// 1 16 0 0 0 10 0 0 0 7 0 0 0 10 4-4cylo.dat
  [1,16,0,0,0,10,0,0,0,7,0,0,0,10, ldraw_lib__4_4cylo()],
];
module ldraw_lib__s__98138s02(step=0, col=false, unit=2/5, alt=false, line=0.2, solid=!$preview)
    makepoly(ldraw_lib__s__98138s02(), step=step, col=col, unit=unit, alt=alt, line=line, solid=solid);
ldraw_lib__s__98138s02(line=0.2);
// file: ../p/4-4ring9.scad
use <../lib.scad>
function ldraw_lib__4_4ring9() = [
// 0 Ring  9 x 1.0
// 0 Name: 4-4ring9.dat
// 0 Author: John Riley [jriley]
// 0 !LDRAW_ORG Primitive UPDATE 2004-02
// 0 !LICENSE Licensed under CC BY 2.0 and CC BY 4.0 : see CAreadme.txt
// 
// 0 BFC CERTIFY CCW
  [0,"BFC","CERTIFY"],
  [0,"BFC","CCW"],
// 
// 0 !HISTORY 2004-04-22 [PTadmin] Official Update 2004-02
// 0 !HISTORY 2007-06-24 [PTadmin] Header formatted for Contributor Agreement
// 0 !HISTORY 2008-07-01 [PTadmin] Official Update 2008-01
// 
// 
// 4 16 9 0 0 10 0 0 9.239 0 3.827 8.3151 0 3.4443
  [4,16,9,0,0,10,0,0,9.239,0,3.827,8.3151,0,3.4443],
// 4 16 8.3151 0 3.4443 9.239 0 3.827 7.071 0 7.071 6.3639 0 6.3639
  [4,16,8.3151,0,3.4443,9.239,0,3.827,7.071,0,7.071,6.3639,0,6.3639],
// 4 16 6.3639 0 6.3639 7.071 0 7.071 3.827 0 9.239 3.4443 0 8.3151
  [4,16,6.3639,0,6.3639,7.071,0,7.071,3.827,0,9.239,3.4443,0,8.3151],
// 4 16 3.4443 0 8.3151 3.827 0 9.239 0 0 10 0 0 9
  [4,16,3.4443,0,8.3151,3.827,0,9.239,0,0,10,0,0,9],
// 4 16 0 0 9 0 0 10 -3.827 0 9.239 -3.4443 0 8.3151
  [4,16,0,0,9,0,0,10,-3.827,0,9.239,-3.4443,0,8.3151],
// 4 16 -3.4443 0 8.3151 -3.827 0 9.239 -7.071 0 7.071 -6.3639 0 6.3639
  [4,16,-3.4443,0,8.3151,-3.827,0,9.239,-7.071,0,7.071,-6.3639,0,6.3639],
// 4 16 -6.3639 0 6.3639 -7.071 0 7.071 -9.239 0 3.827 -8.3151 0 3.4443
  [4,16,-6.3639,0,6.3639,-7.071,0,7.071,-9.239,0,3.827,-8.3151,0,3.4443],
// 4 16 -8.3151 0 3.4443 -9.239 0 3.827 -10 0 0 -9 0 0
  [4,16,-8.3151,0,3.4443,-9.239,0,3.827,-10,0,0,-9,0,0],
// 4 16 -9 0 0 -10 0 0 -9.239 0 -3.827 -8.3151 0 -3.4443
  [4,16,-9,0,0,-10,0,0,-9.239,0,-3.827,-8.3151,0,-3.4443],
// 4 16 -8.3151 0 -3.4443 -9.239 0 -3.827 -7.071 0 -7.071 -6.3639 0 -6.3639
  [4,16,-8.3151,0,-3.4443,-9.239,0,-3.827,-7.071,0,-7.071,-6.3639,0,-6.3639],
// 4 16 -6.3639 0 -6.3639 -7.071 0 -7.071 -3.827 0 -9.239 -3.4443 0 -8.3151
  [4,16,-6.3639,0,-6.3639,-7.071,0,-7.071,-3.827,0,-9.239,-3.4443,0,-8.3151],
// 4 16 -3.4443 0 -8.3151 -3.827 0 -9.239 0 0 -10 0 0 -9
  [4,16,-3.4443,0,-8.3151,-3.827,0,-9.239,0,0,-10,0,0,-9],
// 4 16 0 0 -9 0 0 -10 3.827 0 -9.239 3.4443 0 -8.3151
  [4,16,0,0,-9,0,0,-10,3.827,0,-9.239,3.4443,0,-8.3151],
// 4 16 3.4443 0 -8.3151 3.827 0 -9.239 7.071 0 -7.071 6.3639 0 -6.3639
  [4,16,3.4443,0,-8.3151,3.827,0,-9.239,7.071,0,-7.071,6.3639,0,-6.3639],
// 4 16 6.3639 0 -6.3639 7.071 0 -7.071 9.239 0 -3.827 8.3151 0 -3.4443
  [4,16,6.3639,0,-6.3639,7.071,0,-7.071,9.239,0,-3.827,8.3151,0,-3.4443],
// 4 16 8.3151 0 -3.4443 9.239 0 -3.827 10 0 0 9 0 0
  [4,16,8.3151,0,-3.4443,9.239,0,-3.827,10,0,0,9,0,0],
// 0
];
module ldraw_lib__4_4ring9(step=0, col=false, unit=2/5, alt=false, line=0.2, solid=!$preview)
    makepoly(ldraw_lib__4_4ring9(), step=step, col=col, unit=unit, alt=alt, line=line, solid=solid);
ldraw_lib__4_4ring9(line=0.2);
// file: ../p/1-16chrd.scad
use <../lib.scad>
use <empty.scad>
function ldraw_lib__1_16chrd() = [
// 0 Chord 0.0625
// 0 Name: 1-16chrd.dat
// 0 Author: Philippe Hurbain [Philo]
// 0 !LDRAW_ORG Primitive UPDATE 2015-01
// 0 !LICENSE Licensed under CC BY 4.0 : see CAreadme.txt
// 
// 0 BFC CERTIFY CCW
  [0,"BFC","CERTIFY"],
  [0,"BFC","CCW"],
// 
// 0 !HISTORY 2015-10-11 [PTadmin] Official Update 2015-01
// 
// 
// 0 // This file is intentionally empty because at the current \P resolution,
// 0 // an 1-16chrd is actually empty. However, this file still is present
// 0 // to allow tools to do primitives substition and fill in a real chrd here,
// 0 // or, if desired, to substitute this with the hi-res 48\1-16chrd.
// 
// 0 // This file is based on an idea by Darats at http://forums.ldraw.org/read.php?19,14500,14500#msg-14500
// 
// 1 16 0 0 0 1 0 0 0 1 0 0 0 1 empty.dat
  [1,16,0,0,0,1,0,0,0,1,0,0,0,1, ldraw_lib__empty()],
];
module ldraw_lib__1_16chrd(step=0, col=false, unit=2/5, alt=false, line=0.2, solid=!$preview)
    makepoly(ldraw_lib__1_16chrd(), step=step, col=col, unit=unit, alt=alt, line=line, solid=solid);
ldraw_lib__1_16chrd(line=0.2);
// file: s/98138s01.scad
use <../../lib.scad>
use <../../p/4-4ring9.scad>
use <98138s02.scad>
function ldraw_lib__s__98138s01() = [
// 0 ~Tile  1 x  1 Round with Groove with Partial Top Face
// 0 Name: s\98138s01.dat
// 0 Author: Magnus Forsberg [MagFors]
// 0 !LDRAW_ORG Subpart UPDATE 2020-01
// 0 !LICENSE Licensed under CC BY 4.0 : see CAreadme.txt
// 
// 0 BFC CERTIFY CCW
  [0,"BFC","CERTIFY"],
  [0,"BFC","CCW"],
// 
// 0 !HISTORY 2011-12-29 [PTadmin] Official Update 2011-02
// 0 !HISTORY 2016-06-17 [MagFors] Reduced the rounded edge to 0.5 ldu
// 0 !HISTORY 2016-12-31 [PTadmin] Official Update 2016-01
// 0 !HISTORY 2019-06-17 [MagFors] Removed the rounded edge
// 0 !HISTORY 2019-07-19 [MagFors] Subfiled without top surface
// 0 !HISTORY 2020-06-28 [PTadmin] Official Update 2020-01
// 
// 
// 1 16 0 0 0 1 0 0 0 1 0 0 0 1 s\98138s02.dat
  [1,16,0,0,0,1,0,0,0,1,0,0,0,1, ldraw_lib__s__98138s02()],
// 1 16 0 0 0 1 0 0 0 1 0 0 0 1 4-4ring9.dat
  [1,16,0,0,0,1,0,0,0,1,0,0,0,1, ldraw_lib__4_4ring9()],
];
module ldraw_lib__s__98138s01(step=0, col=false, unit=2/5, alt=false, line=0.2, solid=!$preview)
    makepoly(ldraw_lib__s__98138s01(), step=step, col=col, unit=unit, alt=alt, line=line, solid=solid);
ldraw_lib__s__98138s01(line=0.2);
// file: ../p/4-4ering.scad
use <../lib.scad>
use <1-16chrd.scad>
function ldraw_lib__4_4ering() = [
// 0 Adapter Ring Triangles to Normal 1.0
// 0 Name: 4-4ering.dat
// 0 Author: Philippe Hurbain [Philo]
// 0 !LDRAW_ORG Primitive UPDATE 2015-01
// 0 !LICENSE Licensed under CC BY 4.0 : see CAreadme.txt
// 
// 0 BFC CERTIFY CCW
  [0,"BFC","CERTIFY"],
  [0,"BFC","CCW"],
// 
// 0 !HISTORY 2015-10-11 [PTadmin] Official Update 2015-01
// 
// 
// 0 // This file uses 1-16chrd (actually empty). It allows
// 0 // tools to do primitives substition and fill in a ring of chrd here,
// 0 // or, if desired, to substitute this with the hi-res 48\1-16chrd.
// 0 // This file is based on an idea by Darats at http://forums.ldraw.org/read.php?19,14500,14500#msg-14500
// 
// 1 16 0 0 0 1 0 0 0 1 0 0 0 1 1-16chrd.dat
  [1,16,0,0,0,1,0,0,0,1,0,0,0,1, ldraw_lib__1_16chrd()],
// 1 16 0 0 0 0.92388 0 0.38268 0 1 0 -0.38268 0 0.92388 1-16chrd.dat
  [1,16,0,0,0,0.92388,0,0.38268,0,1,0,-0.38268,0,0.92388, ldraw_lib__1_16chrd()],
// 1 16 0 0 0 0.70711 0 0.70711 0 1 0 -0.70711 0 0.70711 1-16chrd.dat
  [1,16,0,0,0,0.70711,0,0.70711,0,1,0,-0.70711,0,0.70711, ldraw_lib__1_16chrd()],
// 1 16 0 0 0 0.38268 0 0.92388 0 1 0 -0.92388 0 0.38268 1-16chrd.dat
  [1,16,0,0,0,0.38268,0,0.92388,0,1,0,-0.92388,0,0.38268, ldraw_lib__1_16chrd()],
// 1 16 0 0 0 0 0 1 0 1 0 -1 0 0 1-16chrd.dat
  [1,16,0,0,0,0,0,1,0,1,0,-1,0,0, ldraw_lib__1_16chrd()],
// 1 16 0 0 0 -0.38268 0 0.92388 0 1 0 -0.92388 0 -0.38268 1-16chrd.dat
  [1,16,0,0,0,-0.38268,0,0.92388,0,1,0,-0.92388,0,-0.38268, ldraw_lib__1_16chrd()],
// 1 16 0 0 0 -0.70711 0 0.70711 0 1 0 -0.70711 0 -0.70711 1-16chrd.dat
  [1,16,0,0,0,-0.70711,0,0.70711,0,1,0,-0.70711,0,-0.70711, ldraw_lib__1_16chrd()],
// 1 16 0 0 0 -0.92388 0 0.38268 0 1 0 -0.38268 0 -0.92388 1-16chrd.dat
  [1,16,0,0,0,-0.92388,0,0.38268,0,1,0,-0.38268,0,-0.92388, ldraw_lib__1_16chrd()],
// 1 16 0 0 0 0 0 -1 0 1 0 1 0 0 1-16chrd.dat
  [1,16,0,0,0,0,0,-1,0,1,0,1,0,0, ldraw_lib__1_16chrd()],
// 1 16 0 0 0 0.38268 0 -0.92388 0 1 0 0.92388 0 0.38268 1-16chrd.dat
  [1,16,0,0,0,0.38268,0,-0.92388,0,1,0,0.92388,0,0.38268, ldraw_lib__1_16chrd()],
// 1 16 0 0 0 0.70711 0 -0.70711 0 1 0 0.70711 0 0.70711 1-16chrd.dat
  [1,16,0,0,0,0.70711,0,-0.70711,0,1,0,0.70711,0,0.70711, ldraw_lib__1_16chrd()],
// 1 16 0 0 0 0.92388 0 -0.38268 0 1 0 0.38268 0 0.92388 1-16chrd.dat
  [1,16,0,0,0,0.92388,0,-0.38268,0,1,0,0.38268,0,0.92388, ldraw_lib__1_16chrd()],
// 1 16 0 0 0 -1 0 0 0 1 0 0 0 -1 1-16chrd.dat
  [1,16,0,0,0,-1,0,0,0,1,0,0,0,-1, ldraw_lib__1_16chrd()],
// 1 16 0 0 0 -0.92388 0 -0.38268 0 1 0 0.38268 0 -0.92388 1-16chrd.dat
  [1,16,0,0,0,-0.92388,0,-0.38268,0,1,0,0.38268,0,-0.92388, ldraw_lib__1_16chrd()],
// 1 16 0 0 0 -0.70711 0 -0.70711 0 1 0 0.70711 0 -0.70711 1-16chrd.dat
  [1,16,0,0,0,-0.70711,0,-0.70711,0,1,0,0.70711,0,-0.70711, ldraw_lib__1_16chrd()],
// 1 16 0 0 0 -0.38268 0 -0.92388 0 1 0 0.92388 0 -0.38268 1-16chrd.dat
  [1,16,0,0,0,-0.38268,0,-0.92388,0,1,0,0.92388,0,-0.38268, ldraw_lib__1_16chrd()],
];
module ldraw_lib__4_4ering(step=0, col=false, unit=2/5, alt=false, line=0.2, solid=!$preview)
    makepoly(ldraw_lib__4_4ering(), step=step, col=col, unit=unit, alt=alt, line=line, solid=solid);
ldraw_lib__4_4ering(line=0.2);
// main file
use <../lib.scad>
use <../p/4-4ering.scad>
use <s/98138s01.scad>
function ldraw_lib__98138px4() = [
// 0 Tile  1 x  1 Round with Pixelated Red and White on Black Background Minecraft Compass Pattern
// 0 Name: 98138px4.dat
// 0 Author: Gerald Lasser [GeraldLasser]
// 0 !LDRAW_ORG Part UPDATE 2017-01
// 0 !LICENSE Licensed under CC BY 4.0 : see CAreadme.txt
// 
// 0 BFC CERTIFY CCW
  [0,"BFC","CERTIFY"],
  [0,"BFC","CCW"],
// 
// 0 !KEYWORDS BrickLink 98138pb073
// 
// 0 !HISTORY 2017-12-30 [PTadmin] Official Update 2017-01
// 
// 
// 1 16 0 0 0 1 0 0 0 1 0 0 0 1 s\98138s01.dat
  [1,16,0,0,0,1,0,0,0,1,0,0,0,1, ldraw_lib__s__98138s01()],
// 1 0 0 0 0 9 0 0 0 1 0 0 0 9 4-4ering.dat
  [1,0,0,0,0,9,0,0,0,1,0,0,0,9, ldraw_lib__4_4ering()],
// 4 15 1.25 0 -1.25 -1.25 0 -1.25 -1.25 0 -3.75 1.25 0 -3.75
  [4,15,1.25,0,-1.25,-1.25,0,-1.25,-1.25,0,-3.75,1.25,0,-3.75],
// 4 4 -1.25 0 6.25 -1.25 0 1.25 1.25 0 1.25 1.25 0 6.25
  [4,4,-1.25,0,6.25,-1.25,0,1.25,1.25,0,1.25,1.25,0,6.25],
// 4 4 1.25 0 1.25 -1.25 0 1.25 -1.25 0 -1.25 1.25 0 -1.25
  [4,4,1.25,0,1.25,-1.25,0,1.25,-1.25,0,-1.25,1.25,0,-1.25],
// 4 15 -1.25 0 1.25 -3.75 0 1.25 -3.75 0 -1.25 -1.25 0 -1.25
  [4,15,-1.25,0,1.25,-3.75,0,1.25,-3.75,0,-1.25,-1.25,0,-1.25],
// 4 15 3.75 0 1.25 1.25 0 1.25 1.25 0 -1.25 3.75 0 -1.25
  [4,15,3.75,0,1.25,1.25,0,1.25,1.25,0,-1.25,3.75,0,-1.25],
// 4 0 3.75 0 -1.25 1.25 0 -1.25 6.3639 0 -6.3639 8.3151 0 -3.4443
  [4,0,3.75,0,-1.25,1.25,0,-1.25,6.3639,0,-6.3639,8.3151,0,-3.4443],
// 4 0 3.75 0 -1.25 8.3151 0 -3.4443 9 0 0 3.75 0 1.25
  [4,0,3.75,0,-1.25,8.3151,0,-3.4443,9,0,0,3.75,0,1.25],
// 3 0 8.3151 0 3.4443 3.75 0 1.25 9 0 0
  [3,0,8.3151,0,3.4443,3.75,0,1.25,9,0,0],
// 4 0 3.75 0 1.250 8.3151 0 3.4443 6.3639 0 6.3639 1.25 0 1.25
  [4,0,3.75,0,1.250,8.3151,0,3.4443,6.3639,0,6.3639,1.25,0,1.25],
// 4 0 1.25 0 6.25 1.25 0 1.25 6.3639 0 6.3639 3.4443 0 8.3151
  [4,0,1.25,0,6.25,1.25,0,1.25,6.3639,0,6.3639,3.4443,0,8.3151],
// 4 0 1.25 0 6.25 3.4443 0 8.3151 0 0 9 -1.25 0 6.25
  [4,0,1.25,0,6.25,3.4443,0,8.3151,0,0,9,-1.25,0,6.25],
// 4 0 -1.25 0 6.25 0 0 9 -3.4443 0 8.3151 -6.3639 0 6.3639
  [4,0,-1.25,0,6.25,0,0,9,-3.4443,0,8.3151,-6.3639,0,6.3639],
// 4 0 -1.25 0 1.25 -1.25 0 6.25 -6.3639 0 6.3639 -3.75 0 1.25
  [4,0,-1.25,0,1.25,-1.25,0,6.25,-6.3639,0,6.3639,-3.75,0,1.25],
// 4 0 -3.75 0 1.25 -6.3639 0 6.3639 -8.3151 0 3.4443 -9 0 0
  [4,0,-3.75,0,1.25,-6.3639,0,6.3639,-8.3151,0,3.4443,-9,0,0],
// 4 0 -3.75 0 -1.25 -3.75 0 1.25 -9 0 0 -8.3151 0 -3.4443
  [4,0,-3.75,0,-1.25,-3.75,0,1.25,-9,0,0,-8.3151,0,-3.4443],
// 4 0 -3.75 0 -1.25 -8.3151 0 -3.4443 -6.3639 0 -6.3639 -1.25 0 -1.25
  [4,0,-3.75,0,-1.25,-8.3151,0,-3.4443,-6.3639,0,-6.3639,-1.25,0,-1.25],
// 4 0 -1.25 0 -3.75 -1.25 0 -1.25 -6.3639 0 -6.3639 -3.4443 0 -8.3151
  [4,0,-1.25,0,-3.75,-1.25,0,-1.25,-6.3639,0,-6.3639,-3.4443,0,-8.3151],
// 4 0 -1.25 0 -3.75 -3.4443 0 -8.3151 0 0 -9 1.25 0 -3.75
  [4,0,-1.25,0,-3.75,-3.4443,0,-8.3151,0,0,-9,1.25,0,-3.75],
// 4 0 1.25 0 -3.75 0 0 -9 3.4443 0 -8.3151 6.3639 0 -6.3639
  [4,0,1.25,0,-3.75,0,0,-9,3.4443,0,-8.3151,6.3639,0,-6.3639],
// 3 0 1.25 0 -1.25 1.25 0 -3.75 6.3639 0 -6.3639
  [3,0,1.25,0,-1.25,1.25,0,-3.75,6.3639,0,-6.3639],
];
module ldraw_lib__98138px4(step=0, col=false, unit=2/5, alt=false, line=0.2, solid=!$preview)
    makepoly(ldraw_lib__98138px4(), step=step, col=col, unit=unit, alt=alt, line=line, solid=solid);
ldraw_lib__98138px4(line=0.2);
